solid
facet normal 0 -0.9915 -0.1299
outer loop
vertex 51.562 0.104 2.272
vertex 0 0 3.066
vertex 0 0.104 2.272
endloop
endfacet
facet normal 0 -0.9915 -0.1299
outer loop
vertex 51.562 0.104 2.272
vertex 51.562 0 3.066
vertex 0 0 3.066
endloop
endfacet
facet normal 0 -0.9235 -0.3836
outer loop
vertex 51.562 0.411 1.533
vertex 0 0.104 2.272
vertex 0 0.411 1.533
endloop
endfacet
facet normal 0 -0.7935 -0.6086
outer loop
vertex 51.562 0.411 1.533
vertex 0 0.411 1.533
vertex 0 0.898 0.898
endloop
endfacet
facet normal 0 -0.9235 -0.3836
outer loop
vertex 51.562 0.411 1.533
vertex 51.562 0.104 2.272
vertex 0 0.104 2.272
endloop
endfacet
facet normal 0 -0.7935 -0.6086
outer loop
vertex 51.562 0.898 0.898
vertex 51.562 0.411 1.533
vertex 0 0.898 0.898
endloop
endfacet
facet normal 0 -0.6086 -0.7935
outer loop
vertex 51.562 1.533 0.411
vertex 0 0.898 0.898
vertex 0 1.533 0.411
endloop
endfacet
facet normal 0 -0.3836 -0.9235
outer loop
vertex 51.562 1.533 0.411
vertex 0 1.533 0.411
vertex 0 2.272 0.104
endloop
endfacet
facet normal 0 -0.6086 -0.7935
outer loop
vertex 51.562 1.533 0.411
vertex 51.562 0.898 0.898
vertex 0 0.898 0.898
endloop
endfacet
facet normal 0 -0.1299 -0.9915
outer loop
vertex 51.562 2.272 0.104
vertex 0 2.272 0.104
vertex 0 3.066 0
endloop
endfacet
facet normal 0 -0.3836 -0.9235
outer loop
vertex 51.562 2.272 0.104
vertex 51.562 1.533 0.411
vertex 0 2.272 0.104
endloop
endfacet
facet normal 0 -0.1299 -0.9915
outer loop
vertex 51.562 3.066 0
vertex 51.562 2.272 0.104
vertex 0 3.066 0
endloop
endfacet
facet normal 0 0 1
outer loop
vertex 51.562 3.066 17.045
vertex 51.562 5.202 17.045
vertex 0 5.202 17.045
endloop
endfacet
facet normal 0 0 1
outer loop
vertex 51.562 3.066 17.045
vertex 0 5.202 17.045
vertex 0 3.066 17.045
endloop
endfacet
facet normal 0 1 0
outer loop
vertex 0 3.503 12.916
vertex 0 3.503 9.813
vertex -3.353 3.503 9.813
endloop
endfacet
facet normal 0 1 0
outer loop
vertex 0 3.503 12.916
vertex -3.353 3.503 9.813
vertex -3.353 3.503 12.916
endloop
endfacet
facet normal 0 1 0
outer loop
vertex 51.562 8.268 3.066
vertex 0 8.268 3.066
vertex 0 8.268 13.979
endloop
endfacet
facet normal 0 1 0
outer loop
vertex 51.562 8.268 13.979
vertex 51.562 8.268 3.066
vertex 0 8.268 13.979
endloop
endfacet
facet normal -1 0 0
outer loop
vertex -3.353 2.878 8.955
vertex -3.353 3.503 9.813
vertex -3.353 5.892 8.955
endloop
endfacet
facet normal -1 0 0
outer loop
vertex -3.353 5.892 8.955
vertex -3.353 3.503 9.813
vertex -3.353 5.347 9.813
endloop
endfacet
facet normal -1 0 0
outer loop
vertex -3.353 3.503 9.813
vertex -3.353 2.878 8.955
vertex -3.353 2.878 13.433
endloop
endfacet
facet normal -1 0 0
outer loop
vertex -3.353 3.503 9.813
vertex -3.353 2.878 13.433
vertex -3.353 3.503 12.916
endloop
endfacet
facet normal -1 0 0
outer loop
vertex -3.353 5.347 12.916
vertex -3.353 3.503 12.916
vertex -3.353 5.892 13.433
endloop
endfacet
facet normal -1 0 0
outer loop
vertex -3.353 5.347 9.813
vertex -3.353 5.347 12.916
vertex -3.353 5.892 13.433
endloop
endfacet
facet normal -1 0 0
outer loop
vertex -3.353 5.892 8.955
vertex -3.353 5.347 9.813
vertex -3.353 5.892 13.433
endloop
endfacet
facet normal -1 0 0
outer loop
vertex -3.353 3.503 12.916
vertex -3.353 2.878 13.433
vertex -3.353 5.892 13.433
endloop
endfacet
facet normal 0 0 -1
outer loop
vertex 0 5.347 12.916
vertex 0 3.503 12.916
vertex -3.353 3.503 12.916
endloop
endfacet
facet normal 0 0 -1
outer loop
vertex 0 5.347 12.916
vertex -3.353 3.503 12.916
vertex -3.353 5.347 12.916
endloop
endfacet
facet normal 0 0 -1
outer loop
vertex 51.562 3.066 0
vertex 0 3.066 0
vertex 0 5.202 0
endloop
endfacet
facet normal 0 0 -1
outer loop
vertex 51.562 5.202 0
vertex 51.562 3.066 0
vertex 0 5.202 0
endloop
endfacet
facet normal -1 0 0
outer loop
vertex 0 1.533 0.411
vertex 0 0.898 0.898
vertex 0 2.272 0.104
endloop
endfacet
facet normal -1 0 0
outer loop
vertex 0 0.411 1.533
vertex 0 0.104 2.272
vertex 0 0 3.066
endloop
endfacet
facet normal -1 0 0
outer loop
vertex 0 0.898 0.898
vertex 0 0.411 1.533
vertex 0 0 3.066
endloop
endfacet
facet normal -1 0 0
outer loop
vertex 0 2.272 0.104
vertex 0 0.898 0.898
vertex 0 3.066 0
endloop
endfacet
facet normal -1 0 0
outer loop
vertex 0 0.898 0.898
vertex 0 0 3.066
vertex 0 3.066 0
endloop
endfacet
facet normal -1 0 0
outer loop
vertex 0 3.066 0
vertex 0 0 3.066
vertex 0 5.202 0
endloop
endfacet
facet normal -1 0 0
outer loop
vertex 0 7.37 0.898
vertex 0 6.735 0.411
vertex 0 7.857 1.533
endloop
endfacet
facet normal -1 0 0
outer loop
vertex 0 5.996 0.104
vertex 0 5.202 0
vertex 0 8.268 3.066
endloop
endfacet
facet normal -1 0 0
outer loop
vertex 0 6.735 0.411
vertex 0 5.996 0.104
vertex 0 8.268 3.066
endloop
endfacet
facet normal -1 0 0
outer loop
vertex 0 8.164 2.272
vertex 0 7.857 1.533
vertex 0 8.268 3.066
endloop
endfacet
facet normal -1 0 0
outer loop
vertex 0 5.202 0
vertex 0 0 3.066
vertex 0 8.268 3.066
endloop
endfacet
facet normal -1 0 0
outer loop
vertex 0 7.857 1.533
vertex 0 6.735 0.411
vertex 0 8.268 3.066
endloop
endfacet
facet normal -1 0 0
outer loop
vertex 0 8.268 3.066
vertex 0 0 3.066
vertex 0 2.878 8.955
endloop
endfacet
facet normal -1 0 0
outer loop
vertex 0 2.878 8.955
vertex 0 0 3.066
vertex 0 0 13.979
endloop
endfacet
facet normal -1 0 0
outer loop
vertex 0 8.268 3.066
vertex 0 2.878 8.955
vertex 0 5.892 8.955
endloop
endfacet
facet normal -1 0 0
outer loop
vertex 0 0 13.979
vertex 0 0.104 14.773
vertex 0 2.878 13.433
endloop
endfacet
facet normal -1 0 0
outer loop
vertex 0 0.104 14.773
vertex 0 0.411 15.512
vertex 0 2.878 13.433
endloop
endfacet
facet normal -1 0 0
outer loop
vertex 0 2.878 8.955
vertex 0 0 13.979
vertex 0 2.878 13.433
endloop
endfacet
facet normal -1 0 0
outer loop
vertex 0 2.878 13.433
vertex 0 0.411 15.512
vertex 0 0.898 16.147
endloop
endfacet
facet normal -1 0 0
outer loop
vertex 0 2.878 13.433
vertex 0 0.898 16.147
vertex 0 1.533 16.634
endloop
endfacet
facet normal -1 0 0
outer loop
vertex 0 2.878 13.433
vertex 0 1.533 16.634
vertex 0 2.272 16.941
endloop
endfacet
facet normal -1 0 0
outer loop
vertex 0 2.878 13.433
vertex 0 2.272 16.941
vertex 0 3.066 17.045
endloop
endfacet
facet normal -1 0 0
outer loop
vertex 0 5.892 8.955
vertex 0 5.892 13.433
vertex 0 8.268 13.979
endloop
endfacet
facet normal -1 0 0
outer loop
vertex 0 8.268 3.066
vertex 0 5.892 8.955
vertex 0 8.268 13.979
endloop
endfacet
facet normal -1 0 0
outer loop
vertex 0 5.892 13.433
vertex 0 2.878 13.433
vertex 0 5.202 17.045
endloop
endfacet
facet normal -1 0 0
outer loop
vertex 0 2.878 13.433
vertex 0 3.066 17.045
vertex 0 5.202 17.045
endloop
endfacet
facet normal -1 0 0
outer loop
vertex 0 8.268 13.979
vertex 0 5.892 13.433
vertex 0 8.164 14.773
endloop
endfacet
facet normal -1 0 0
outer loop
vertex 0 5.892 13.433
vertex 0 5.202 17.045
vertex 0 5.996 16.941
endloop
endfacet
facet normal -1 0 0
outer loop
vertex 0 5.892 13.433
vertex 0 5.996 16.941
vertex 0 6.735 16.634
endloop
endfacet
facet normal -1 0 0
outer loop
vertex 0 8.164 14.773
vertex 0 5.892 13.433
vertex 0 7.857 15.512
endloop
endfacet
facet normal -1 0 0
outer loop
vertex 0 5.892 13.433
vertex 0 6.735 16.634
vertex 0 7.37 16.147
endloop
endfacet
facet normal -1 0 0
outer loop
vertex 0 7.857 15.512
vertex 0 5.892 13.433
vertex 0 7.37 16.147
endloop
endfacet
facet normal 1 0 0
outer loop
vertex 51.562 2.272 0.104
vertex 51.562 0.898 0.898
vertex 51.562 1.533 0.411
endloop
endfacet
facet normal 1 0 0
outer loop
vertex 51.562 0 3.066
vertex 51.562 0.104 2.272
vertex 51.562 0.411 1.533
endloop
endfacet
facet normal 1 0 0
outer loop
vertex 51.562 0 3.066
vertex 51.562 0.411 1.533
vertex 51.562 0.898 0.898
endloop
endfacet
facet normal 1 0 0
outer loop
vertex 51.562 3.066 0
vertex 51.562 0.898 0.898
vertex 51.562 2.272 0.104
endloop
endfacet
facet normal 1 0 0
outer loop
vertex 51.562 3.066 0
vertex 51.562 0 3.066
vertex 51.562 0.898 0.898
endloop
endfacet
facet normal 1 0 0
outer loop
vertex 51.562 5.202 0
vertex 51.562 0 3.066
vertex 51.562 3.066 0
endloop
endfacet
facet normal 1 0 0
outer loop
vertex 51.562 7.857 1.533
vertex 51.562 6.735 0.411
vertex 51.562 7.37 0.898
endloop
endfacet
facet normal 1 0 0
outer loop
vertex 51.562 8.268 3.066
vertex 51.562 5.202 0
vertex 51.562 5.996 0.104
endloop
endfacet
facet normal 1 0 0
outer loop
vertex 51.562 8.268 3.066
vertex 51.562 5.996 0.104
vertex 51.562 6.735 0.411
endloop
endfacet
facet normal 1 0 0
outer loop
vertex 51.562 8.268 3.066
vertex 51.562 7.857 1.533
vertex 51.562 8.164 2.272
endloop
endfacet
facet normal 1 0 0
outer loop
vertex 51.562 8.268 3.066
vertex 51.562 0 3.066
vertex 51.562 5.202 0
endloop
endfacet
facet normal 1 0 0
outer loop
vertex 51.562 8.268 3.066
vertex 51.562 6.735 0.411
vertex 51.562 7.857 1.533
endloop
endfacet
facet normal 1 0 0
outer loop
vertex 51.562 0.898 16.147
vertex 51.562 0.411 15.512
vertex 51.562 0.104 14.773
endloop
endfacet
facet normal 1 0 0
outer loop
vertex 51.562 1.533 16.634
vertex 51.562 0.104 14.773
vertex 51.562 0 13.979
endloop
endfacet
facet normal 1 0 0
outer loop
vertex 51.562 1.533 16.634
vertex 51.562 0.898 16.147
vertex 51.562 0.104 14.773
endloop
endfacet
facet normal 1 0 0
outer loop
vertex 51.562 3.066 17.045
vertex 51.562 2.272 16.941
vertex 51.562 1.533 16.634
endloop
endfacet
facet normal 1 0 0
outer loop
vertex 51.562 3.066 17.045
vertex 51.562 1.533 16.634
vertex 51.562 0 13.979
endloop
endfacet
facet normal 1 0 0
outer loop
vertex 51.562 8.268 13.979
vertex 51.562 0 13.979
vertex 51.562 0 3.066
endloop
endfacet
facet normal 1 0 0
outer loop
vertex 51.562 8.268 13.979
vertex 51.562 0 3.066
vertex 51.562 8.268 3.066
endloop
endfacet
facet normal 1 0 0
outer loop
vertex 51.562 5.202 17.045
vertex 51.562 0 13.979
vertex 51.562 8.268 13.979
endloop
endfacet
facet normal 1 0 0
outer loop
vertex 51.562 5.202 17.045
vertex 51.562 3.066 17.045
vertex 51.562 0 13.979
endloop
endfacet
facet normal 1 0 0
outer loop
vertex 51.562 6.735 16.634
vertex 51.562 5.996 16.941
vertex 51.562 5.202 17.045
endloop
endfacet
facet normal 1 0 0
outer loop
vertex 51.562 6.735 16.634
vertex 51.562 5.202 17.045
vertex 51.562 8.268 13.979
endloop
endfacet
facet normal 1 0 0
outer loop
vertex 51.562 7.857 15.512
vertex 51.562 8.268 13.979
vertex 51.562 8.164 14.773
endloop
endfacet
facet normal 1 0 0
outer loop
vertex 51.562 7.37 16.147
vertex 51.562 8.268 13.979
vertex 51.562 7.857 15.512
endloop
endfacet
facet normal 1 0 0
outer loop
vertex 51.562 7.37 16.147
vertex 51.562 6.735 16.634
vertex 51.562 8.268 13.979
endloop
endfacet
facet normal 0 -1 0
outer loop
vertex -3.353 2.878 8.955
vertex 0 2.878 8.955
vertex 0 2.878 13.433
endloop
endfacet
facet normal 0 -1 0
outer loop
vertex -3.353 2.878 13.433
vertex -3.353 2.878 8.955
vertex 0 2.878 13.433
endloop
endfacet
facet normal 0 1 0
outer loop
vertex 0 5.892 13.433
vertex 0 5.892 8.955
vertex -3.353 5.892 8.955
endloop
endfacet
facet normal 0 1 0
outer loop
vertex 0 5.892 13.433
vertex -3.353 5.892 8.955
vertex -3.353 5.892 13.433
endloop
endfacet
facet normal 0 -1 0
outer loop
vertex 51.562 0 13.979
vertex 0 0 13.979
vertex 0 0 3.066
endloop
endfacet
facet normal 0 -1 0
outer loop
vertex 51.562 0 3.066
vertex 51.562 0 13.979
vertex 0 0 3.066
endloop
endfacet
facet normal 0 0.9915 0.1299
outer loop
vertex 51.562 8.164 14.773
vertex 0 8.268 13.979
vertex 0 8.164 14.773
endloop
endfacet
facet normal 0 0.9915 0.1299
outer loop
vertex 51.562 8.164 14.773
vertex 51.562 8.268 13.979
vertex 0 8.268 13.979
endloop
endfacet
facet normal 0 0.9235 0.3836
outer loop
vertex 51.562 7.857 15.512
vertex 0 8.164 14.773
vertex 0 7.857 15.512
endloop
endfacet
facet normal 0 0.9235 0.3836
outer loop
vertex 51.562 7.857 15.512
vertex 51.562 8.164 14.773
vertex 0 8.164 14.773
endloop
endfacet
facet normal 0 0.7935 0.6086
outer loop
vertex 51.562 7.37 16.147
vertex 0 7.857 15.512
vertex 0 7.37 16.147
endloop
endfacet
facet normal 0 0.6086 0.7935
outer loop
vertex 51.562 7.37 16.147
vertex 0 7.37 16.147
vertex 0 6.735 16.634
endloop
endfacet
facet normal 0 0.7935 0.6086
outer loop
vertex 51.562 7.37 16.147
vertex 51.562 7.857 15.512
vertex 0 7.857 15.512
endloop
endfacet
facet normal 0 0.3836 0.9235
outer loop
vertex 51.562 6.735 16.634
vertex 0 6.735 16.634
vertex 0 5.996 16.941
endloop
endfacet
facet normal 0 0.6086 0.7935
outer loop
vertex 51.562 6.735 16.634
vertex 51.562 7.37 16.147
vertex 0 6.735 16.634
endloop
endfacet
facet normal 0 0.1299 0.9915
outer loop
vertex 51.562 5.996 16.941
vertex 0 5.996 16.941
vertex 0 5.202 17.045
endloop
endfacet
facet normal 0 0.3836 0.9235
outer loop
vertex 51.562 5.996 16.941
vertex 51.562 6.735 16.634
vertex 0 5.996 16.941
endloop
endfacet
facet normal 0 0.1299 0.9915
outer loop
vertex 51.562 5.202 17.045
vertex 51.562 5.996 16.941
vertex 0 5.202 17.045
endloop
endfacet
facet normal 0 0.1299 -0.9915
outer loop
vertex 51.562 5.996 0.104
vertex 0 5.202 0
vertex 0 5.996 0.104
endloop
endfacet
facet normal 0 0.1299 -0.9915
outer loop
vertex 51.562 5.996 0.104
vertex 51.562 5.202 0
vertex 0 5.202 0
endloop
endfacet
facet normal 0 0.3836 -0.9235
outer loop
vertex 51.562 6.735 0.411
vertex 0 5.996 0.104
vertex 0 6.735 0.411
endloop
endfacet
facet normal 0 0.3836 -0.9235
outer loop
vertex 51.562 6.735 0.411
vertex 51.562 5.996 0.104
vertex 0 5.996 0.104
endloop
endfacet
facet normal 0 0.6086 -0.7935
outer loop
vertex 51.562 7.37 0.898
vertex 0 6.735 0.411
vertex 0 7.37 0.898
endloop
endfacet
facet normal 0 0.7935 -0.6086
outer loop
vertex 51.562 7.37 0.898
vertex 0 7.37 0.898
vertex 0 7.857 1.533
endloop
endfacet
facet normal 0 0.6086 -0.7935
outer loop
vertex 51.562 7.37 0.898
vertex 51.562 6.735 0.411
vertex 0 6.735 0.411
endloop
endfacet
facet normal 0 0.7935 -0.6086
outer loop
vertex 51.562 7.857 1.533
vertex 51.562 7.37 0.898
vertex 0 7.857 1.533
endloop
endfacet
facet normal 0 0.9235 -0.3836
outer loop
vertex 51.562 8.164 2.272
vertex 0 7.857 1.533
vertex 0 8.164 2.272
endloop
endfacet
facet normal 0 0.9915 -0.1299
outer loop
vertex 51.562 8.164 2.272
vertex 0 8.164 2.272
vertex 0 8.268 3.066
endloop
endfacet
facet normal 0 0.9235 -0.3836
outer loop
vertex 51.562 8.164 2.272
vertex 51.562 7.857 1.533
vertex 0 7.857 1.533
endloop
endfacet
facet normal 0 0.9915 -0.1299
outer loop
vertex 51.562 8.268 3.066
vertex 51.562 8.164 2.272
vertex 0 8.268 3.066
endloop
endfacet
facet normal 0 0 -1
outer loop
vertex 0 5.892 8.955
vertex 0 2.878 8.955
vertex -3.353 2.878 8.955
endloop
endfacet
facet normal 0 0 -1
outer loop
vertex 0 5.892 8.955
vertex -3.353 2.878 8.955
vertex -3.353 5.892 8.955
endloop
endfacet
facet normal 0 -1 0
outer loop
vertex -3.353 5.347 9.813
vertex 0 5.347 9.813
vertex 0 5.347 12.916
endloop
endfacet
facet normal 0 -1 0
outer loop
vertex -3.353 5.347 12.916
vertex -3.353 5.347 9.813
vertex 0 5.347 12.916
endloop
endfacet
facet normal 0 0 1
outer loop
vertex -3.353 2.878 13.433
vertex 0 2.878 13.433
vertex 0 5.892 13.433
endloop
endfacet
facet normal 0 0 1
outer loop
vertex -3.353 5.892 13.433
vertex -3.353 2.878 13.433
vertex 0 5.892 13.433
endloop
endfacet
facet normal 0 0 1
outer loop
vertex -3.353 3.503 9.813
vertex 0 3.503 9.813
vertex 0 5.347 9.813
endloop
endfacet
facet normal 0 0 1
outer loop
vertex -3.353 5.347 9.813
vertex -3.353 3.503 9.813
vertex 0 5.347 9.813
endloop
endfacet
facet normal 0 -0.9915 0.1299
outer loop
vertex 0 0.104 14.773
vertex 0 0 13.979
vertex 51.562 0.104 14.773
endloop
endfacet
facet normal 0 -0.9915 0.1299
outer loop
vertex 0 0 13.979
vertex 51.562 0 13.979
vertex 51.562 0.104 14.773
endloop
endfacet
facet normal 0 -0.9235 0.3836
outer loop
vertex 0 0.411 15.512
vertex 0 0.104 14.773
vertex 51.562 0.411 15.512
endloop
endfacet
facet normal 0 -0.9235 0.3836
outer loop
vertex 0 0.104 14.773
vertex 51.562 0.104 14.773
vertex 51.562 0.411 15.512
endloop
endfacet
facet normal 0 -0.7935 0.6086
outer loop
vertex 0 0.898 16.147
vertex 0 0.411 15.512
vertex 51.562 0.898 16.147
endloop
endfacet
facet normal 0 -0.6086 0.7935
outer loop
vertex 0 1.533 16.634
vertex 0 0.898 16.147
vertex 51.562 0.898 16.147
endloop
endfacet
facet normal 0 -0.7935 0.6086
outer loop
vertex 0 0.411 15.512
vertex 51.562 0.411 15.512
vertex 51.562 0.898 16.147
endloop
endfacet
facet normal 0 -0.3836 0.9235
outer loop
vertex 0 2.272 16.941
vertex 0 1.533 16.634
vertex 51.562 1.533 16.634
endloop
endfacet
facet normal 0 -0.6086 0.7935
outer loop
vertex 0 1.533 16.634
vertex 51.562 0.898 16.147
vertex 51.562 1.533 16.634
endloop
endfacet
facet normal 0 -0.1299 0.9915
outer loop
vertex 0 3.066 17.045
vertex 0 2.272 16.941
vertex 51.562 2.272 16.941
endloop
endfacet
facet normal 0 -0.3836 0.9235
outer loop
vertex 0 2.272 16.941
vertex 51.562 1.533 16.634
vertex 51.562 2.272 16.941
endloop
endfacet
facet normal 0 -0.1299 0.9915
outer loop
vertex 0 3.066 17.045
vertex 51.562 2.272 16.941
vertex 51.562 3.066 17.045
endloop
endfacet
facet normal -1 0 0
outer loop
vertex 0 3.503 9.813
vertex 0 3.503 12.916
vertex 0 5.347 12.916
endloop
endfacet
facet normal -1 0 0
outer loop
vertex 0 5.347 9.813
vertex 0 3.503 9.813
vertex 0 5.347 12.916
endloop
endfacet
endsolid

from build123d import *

# Parameters (mm, degrees)
F1_DEPTH = 51.562
F2_R     = 3.066051
F3_W     = 3.014619
F3_H     = 4.478862
F3_W_2   = 1.843878
F3_H_2   = 3.103115
F4_DEPTH = 3.3528


with BuildPart() as f1:
    # F0 (on Right) → F1 (new body)
    with BuildSketch(Plane.YZ):
        Polygon((0, 17.045056), (0, 0), (4.706469, 0), (8.268126, 0), (8.268126, 17.045056), (4.706469, 17.045056), align=None)
    extrude(amount=F1_DEPTH)

    # F2
    f2_edges = [f1.edges().sort_by_distance(p)[0] for p in [
        (25.781, 8.268126, 17.045056),
        (25.781, 0, 17.045056),
        (25.781, 8.268126, 0),
        (25.781, 0, 0),
    ]]
    fillet(f2_edges, radius=F2_R)

    # F3 (on Right) → F4 (join)
    with BuildSketch(Plane.YZ):
        with Locations((4.38504, 11.194011)):
            Rectangle(F3_W, F3_H)
        with Locations((4.424905, 11.364611)):
            Rectangle(F3_W_2, F3_H_2, mode=Mode.SUBTRACT)
    extrude(amount=-F4_DEPTH)


solid = f1.part
